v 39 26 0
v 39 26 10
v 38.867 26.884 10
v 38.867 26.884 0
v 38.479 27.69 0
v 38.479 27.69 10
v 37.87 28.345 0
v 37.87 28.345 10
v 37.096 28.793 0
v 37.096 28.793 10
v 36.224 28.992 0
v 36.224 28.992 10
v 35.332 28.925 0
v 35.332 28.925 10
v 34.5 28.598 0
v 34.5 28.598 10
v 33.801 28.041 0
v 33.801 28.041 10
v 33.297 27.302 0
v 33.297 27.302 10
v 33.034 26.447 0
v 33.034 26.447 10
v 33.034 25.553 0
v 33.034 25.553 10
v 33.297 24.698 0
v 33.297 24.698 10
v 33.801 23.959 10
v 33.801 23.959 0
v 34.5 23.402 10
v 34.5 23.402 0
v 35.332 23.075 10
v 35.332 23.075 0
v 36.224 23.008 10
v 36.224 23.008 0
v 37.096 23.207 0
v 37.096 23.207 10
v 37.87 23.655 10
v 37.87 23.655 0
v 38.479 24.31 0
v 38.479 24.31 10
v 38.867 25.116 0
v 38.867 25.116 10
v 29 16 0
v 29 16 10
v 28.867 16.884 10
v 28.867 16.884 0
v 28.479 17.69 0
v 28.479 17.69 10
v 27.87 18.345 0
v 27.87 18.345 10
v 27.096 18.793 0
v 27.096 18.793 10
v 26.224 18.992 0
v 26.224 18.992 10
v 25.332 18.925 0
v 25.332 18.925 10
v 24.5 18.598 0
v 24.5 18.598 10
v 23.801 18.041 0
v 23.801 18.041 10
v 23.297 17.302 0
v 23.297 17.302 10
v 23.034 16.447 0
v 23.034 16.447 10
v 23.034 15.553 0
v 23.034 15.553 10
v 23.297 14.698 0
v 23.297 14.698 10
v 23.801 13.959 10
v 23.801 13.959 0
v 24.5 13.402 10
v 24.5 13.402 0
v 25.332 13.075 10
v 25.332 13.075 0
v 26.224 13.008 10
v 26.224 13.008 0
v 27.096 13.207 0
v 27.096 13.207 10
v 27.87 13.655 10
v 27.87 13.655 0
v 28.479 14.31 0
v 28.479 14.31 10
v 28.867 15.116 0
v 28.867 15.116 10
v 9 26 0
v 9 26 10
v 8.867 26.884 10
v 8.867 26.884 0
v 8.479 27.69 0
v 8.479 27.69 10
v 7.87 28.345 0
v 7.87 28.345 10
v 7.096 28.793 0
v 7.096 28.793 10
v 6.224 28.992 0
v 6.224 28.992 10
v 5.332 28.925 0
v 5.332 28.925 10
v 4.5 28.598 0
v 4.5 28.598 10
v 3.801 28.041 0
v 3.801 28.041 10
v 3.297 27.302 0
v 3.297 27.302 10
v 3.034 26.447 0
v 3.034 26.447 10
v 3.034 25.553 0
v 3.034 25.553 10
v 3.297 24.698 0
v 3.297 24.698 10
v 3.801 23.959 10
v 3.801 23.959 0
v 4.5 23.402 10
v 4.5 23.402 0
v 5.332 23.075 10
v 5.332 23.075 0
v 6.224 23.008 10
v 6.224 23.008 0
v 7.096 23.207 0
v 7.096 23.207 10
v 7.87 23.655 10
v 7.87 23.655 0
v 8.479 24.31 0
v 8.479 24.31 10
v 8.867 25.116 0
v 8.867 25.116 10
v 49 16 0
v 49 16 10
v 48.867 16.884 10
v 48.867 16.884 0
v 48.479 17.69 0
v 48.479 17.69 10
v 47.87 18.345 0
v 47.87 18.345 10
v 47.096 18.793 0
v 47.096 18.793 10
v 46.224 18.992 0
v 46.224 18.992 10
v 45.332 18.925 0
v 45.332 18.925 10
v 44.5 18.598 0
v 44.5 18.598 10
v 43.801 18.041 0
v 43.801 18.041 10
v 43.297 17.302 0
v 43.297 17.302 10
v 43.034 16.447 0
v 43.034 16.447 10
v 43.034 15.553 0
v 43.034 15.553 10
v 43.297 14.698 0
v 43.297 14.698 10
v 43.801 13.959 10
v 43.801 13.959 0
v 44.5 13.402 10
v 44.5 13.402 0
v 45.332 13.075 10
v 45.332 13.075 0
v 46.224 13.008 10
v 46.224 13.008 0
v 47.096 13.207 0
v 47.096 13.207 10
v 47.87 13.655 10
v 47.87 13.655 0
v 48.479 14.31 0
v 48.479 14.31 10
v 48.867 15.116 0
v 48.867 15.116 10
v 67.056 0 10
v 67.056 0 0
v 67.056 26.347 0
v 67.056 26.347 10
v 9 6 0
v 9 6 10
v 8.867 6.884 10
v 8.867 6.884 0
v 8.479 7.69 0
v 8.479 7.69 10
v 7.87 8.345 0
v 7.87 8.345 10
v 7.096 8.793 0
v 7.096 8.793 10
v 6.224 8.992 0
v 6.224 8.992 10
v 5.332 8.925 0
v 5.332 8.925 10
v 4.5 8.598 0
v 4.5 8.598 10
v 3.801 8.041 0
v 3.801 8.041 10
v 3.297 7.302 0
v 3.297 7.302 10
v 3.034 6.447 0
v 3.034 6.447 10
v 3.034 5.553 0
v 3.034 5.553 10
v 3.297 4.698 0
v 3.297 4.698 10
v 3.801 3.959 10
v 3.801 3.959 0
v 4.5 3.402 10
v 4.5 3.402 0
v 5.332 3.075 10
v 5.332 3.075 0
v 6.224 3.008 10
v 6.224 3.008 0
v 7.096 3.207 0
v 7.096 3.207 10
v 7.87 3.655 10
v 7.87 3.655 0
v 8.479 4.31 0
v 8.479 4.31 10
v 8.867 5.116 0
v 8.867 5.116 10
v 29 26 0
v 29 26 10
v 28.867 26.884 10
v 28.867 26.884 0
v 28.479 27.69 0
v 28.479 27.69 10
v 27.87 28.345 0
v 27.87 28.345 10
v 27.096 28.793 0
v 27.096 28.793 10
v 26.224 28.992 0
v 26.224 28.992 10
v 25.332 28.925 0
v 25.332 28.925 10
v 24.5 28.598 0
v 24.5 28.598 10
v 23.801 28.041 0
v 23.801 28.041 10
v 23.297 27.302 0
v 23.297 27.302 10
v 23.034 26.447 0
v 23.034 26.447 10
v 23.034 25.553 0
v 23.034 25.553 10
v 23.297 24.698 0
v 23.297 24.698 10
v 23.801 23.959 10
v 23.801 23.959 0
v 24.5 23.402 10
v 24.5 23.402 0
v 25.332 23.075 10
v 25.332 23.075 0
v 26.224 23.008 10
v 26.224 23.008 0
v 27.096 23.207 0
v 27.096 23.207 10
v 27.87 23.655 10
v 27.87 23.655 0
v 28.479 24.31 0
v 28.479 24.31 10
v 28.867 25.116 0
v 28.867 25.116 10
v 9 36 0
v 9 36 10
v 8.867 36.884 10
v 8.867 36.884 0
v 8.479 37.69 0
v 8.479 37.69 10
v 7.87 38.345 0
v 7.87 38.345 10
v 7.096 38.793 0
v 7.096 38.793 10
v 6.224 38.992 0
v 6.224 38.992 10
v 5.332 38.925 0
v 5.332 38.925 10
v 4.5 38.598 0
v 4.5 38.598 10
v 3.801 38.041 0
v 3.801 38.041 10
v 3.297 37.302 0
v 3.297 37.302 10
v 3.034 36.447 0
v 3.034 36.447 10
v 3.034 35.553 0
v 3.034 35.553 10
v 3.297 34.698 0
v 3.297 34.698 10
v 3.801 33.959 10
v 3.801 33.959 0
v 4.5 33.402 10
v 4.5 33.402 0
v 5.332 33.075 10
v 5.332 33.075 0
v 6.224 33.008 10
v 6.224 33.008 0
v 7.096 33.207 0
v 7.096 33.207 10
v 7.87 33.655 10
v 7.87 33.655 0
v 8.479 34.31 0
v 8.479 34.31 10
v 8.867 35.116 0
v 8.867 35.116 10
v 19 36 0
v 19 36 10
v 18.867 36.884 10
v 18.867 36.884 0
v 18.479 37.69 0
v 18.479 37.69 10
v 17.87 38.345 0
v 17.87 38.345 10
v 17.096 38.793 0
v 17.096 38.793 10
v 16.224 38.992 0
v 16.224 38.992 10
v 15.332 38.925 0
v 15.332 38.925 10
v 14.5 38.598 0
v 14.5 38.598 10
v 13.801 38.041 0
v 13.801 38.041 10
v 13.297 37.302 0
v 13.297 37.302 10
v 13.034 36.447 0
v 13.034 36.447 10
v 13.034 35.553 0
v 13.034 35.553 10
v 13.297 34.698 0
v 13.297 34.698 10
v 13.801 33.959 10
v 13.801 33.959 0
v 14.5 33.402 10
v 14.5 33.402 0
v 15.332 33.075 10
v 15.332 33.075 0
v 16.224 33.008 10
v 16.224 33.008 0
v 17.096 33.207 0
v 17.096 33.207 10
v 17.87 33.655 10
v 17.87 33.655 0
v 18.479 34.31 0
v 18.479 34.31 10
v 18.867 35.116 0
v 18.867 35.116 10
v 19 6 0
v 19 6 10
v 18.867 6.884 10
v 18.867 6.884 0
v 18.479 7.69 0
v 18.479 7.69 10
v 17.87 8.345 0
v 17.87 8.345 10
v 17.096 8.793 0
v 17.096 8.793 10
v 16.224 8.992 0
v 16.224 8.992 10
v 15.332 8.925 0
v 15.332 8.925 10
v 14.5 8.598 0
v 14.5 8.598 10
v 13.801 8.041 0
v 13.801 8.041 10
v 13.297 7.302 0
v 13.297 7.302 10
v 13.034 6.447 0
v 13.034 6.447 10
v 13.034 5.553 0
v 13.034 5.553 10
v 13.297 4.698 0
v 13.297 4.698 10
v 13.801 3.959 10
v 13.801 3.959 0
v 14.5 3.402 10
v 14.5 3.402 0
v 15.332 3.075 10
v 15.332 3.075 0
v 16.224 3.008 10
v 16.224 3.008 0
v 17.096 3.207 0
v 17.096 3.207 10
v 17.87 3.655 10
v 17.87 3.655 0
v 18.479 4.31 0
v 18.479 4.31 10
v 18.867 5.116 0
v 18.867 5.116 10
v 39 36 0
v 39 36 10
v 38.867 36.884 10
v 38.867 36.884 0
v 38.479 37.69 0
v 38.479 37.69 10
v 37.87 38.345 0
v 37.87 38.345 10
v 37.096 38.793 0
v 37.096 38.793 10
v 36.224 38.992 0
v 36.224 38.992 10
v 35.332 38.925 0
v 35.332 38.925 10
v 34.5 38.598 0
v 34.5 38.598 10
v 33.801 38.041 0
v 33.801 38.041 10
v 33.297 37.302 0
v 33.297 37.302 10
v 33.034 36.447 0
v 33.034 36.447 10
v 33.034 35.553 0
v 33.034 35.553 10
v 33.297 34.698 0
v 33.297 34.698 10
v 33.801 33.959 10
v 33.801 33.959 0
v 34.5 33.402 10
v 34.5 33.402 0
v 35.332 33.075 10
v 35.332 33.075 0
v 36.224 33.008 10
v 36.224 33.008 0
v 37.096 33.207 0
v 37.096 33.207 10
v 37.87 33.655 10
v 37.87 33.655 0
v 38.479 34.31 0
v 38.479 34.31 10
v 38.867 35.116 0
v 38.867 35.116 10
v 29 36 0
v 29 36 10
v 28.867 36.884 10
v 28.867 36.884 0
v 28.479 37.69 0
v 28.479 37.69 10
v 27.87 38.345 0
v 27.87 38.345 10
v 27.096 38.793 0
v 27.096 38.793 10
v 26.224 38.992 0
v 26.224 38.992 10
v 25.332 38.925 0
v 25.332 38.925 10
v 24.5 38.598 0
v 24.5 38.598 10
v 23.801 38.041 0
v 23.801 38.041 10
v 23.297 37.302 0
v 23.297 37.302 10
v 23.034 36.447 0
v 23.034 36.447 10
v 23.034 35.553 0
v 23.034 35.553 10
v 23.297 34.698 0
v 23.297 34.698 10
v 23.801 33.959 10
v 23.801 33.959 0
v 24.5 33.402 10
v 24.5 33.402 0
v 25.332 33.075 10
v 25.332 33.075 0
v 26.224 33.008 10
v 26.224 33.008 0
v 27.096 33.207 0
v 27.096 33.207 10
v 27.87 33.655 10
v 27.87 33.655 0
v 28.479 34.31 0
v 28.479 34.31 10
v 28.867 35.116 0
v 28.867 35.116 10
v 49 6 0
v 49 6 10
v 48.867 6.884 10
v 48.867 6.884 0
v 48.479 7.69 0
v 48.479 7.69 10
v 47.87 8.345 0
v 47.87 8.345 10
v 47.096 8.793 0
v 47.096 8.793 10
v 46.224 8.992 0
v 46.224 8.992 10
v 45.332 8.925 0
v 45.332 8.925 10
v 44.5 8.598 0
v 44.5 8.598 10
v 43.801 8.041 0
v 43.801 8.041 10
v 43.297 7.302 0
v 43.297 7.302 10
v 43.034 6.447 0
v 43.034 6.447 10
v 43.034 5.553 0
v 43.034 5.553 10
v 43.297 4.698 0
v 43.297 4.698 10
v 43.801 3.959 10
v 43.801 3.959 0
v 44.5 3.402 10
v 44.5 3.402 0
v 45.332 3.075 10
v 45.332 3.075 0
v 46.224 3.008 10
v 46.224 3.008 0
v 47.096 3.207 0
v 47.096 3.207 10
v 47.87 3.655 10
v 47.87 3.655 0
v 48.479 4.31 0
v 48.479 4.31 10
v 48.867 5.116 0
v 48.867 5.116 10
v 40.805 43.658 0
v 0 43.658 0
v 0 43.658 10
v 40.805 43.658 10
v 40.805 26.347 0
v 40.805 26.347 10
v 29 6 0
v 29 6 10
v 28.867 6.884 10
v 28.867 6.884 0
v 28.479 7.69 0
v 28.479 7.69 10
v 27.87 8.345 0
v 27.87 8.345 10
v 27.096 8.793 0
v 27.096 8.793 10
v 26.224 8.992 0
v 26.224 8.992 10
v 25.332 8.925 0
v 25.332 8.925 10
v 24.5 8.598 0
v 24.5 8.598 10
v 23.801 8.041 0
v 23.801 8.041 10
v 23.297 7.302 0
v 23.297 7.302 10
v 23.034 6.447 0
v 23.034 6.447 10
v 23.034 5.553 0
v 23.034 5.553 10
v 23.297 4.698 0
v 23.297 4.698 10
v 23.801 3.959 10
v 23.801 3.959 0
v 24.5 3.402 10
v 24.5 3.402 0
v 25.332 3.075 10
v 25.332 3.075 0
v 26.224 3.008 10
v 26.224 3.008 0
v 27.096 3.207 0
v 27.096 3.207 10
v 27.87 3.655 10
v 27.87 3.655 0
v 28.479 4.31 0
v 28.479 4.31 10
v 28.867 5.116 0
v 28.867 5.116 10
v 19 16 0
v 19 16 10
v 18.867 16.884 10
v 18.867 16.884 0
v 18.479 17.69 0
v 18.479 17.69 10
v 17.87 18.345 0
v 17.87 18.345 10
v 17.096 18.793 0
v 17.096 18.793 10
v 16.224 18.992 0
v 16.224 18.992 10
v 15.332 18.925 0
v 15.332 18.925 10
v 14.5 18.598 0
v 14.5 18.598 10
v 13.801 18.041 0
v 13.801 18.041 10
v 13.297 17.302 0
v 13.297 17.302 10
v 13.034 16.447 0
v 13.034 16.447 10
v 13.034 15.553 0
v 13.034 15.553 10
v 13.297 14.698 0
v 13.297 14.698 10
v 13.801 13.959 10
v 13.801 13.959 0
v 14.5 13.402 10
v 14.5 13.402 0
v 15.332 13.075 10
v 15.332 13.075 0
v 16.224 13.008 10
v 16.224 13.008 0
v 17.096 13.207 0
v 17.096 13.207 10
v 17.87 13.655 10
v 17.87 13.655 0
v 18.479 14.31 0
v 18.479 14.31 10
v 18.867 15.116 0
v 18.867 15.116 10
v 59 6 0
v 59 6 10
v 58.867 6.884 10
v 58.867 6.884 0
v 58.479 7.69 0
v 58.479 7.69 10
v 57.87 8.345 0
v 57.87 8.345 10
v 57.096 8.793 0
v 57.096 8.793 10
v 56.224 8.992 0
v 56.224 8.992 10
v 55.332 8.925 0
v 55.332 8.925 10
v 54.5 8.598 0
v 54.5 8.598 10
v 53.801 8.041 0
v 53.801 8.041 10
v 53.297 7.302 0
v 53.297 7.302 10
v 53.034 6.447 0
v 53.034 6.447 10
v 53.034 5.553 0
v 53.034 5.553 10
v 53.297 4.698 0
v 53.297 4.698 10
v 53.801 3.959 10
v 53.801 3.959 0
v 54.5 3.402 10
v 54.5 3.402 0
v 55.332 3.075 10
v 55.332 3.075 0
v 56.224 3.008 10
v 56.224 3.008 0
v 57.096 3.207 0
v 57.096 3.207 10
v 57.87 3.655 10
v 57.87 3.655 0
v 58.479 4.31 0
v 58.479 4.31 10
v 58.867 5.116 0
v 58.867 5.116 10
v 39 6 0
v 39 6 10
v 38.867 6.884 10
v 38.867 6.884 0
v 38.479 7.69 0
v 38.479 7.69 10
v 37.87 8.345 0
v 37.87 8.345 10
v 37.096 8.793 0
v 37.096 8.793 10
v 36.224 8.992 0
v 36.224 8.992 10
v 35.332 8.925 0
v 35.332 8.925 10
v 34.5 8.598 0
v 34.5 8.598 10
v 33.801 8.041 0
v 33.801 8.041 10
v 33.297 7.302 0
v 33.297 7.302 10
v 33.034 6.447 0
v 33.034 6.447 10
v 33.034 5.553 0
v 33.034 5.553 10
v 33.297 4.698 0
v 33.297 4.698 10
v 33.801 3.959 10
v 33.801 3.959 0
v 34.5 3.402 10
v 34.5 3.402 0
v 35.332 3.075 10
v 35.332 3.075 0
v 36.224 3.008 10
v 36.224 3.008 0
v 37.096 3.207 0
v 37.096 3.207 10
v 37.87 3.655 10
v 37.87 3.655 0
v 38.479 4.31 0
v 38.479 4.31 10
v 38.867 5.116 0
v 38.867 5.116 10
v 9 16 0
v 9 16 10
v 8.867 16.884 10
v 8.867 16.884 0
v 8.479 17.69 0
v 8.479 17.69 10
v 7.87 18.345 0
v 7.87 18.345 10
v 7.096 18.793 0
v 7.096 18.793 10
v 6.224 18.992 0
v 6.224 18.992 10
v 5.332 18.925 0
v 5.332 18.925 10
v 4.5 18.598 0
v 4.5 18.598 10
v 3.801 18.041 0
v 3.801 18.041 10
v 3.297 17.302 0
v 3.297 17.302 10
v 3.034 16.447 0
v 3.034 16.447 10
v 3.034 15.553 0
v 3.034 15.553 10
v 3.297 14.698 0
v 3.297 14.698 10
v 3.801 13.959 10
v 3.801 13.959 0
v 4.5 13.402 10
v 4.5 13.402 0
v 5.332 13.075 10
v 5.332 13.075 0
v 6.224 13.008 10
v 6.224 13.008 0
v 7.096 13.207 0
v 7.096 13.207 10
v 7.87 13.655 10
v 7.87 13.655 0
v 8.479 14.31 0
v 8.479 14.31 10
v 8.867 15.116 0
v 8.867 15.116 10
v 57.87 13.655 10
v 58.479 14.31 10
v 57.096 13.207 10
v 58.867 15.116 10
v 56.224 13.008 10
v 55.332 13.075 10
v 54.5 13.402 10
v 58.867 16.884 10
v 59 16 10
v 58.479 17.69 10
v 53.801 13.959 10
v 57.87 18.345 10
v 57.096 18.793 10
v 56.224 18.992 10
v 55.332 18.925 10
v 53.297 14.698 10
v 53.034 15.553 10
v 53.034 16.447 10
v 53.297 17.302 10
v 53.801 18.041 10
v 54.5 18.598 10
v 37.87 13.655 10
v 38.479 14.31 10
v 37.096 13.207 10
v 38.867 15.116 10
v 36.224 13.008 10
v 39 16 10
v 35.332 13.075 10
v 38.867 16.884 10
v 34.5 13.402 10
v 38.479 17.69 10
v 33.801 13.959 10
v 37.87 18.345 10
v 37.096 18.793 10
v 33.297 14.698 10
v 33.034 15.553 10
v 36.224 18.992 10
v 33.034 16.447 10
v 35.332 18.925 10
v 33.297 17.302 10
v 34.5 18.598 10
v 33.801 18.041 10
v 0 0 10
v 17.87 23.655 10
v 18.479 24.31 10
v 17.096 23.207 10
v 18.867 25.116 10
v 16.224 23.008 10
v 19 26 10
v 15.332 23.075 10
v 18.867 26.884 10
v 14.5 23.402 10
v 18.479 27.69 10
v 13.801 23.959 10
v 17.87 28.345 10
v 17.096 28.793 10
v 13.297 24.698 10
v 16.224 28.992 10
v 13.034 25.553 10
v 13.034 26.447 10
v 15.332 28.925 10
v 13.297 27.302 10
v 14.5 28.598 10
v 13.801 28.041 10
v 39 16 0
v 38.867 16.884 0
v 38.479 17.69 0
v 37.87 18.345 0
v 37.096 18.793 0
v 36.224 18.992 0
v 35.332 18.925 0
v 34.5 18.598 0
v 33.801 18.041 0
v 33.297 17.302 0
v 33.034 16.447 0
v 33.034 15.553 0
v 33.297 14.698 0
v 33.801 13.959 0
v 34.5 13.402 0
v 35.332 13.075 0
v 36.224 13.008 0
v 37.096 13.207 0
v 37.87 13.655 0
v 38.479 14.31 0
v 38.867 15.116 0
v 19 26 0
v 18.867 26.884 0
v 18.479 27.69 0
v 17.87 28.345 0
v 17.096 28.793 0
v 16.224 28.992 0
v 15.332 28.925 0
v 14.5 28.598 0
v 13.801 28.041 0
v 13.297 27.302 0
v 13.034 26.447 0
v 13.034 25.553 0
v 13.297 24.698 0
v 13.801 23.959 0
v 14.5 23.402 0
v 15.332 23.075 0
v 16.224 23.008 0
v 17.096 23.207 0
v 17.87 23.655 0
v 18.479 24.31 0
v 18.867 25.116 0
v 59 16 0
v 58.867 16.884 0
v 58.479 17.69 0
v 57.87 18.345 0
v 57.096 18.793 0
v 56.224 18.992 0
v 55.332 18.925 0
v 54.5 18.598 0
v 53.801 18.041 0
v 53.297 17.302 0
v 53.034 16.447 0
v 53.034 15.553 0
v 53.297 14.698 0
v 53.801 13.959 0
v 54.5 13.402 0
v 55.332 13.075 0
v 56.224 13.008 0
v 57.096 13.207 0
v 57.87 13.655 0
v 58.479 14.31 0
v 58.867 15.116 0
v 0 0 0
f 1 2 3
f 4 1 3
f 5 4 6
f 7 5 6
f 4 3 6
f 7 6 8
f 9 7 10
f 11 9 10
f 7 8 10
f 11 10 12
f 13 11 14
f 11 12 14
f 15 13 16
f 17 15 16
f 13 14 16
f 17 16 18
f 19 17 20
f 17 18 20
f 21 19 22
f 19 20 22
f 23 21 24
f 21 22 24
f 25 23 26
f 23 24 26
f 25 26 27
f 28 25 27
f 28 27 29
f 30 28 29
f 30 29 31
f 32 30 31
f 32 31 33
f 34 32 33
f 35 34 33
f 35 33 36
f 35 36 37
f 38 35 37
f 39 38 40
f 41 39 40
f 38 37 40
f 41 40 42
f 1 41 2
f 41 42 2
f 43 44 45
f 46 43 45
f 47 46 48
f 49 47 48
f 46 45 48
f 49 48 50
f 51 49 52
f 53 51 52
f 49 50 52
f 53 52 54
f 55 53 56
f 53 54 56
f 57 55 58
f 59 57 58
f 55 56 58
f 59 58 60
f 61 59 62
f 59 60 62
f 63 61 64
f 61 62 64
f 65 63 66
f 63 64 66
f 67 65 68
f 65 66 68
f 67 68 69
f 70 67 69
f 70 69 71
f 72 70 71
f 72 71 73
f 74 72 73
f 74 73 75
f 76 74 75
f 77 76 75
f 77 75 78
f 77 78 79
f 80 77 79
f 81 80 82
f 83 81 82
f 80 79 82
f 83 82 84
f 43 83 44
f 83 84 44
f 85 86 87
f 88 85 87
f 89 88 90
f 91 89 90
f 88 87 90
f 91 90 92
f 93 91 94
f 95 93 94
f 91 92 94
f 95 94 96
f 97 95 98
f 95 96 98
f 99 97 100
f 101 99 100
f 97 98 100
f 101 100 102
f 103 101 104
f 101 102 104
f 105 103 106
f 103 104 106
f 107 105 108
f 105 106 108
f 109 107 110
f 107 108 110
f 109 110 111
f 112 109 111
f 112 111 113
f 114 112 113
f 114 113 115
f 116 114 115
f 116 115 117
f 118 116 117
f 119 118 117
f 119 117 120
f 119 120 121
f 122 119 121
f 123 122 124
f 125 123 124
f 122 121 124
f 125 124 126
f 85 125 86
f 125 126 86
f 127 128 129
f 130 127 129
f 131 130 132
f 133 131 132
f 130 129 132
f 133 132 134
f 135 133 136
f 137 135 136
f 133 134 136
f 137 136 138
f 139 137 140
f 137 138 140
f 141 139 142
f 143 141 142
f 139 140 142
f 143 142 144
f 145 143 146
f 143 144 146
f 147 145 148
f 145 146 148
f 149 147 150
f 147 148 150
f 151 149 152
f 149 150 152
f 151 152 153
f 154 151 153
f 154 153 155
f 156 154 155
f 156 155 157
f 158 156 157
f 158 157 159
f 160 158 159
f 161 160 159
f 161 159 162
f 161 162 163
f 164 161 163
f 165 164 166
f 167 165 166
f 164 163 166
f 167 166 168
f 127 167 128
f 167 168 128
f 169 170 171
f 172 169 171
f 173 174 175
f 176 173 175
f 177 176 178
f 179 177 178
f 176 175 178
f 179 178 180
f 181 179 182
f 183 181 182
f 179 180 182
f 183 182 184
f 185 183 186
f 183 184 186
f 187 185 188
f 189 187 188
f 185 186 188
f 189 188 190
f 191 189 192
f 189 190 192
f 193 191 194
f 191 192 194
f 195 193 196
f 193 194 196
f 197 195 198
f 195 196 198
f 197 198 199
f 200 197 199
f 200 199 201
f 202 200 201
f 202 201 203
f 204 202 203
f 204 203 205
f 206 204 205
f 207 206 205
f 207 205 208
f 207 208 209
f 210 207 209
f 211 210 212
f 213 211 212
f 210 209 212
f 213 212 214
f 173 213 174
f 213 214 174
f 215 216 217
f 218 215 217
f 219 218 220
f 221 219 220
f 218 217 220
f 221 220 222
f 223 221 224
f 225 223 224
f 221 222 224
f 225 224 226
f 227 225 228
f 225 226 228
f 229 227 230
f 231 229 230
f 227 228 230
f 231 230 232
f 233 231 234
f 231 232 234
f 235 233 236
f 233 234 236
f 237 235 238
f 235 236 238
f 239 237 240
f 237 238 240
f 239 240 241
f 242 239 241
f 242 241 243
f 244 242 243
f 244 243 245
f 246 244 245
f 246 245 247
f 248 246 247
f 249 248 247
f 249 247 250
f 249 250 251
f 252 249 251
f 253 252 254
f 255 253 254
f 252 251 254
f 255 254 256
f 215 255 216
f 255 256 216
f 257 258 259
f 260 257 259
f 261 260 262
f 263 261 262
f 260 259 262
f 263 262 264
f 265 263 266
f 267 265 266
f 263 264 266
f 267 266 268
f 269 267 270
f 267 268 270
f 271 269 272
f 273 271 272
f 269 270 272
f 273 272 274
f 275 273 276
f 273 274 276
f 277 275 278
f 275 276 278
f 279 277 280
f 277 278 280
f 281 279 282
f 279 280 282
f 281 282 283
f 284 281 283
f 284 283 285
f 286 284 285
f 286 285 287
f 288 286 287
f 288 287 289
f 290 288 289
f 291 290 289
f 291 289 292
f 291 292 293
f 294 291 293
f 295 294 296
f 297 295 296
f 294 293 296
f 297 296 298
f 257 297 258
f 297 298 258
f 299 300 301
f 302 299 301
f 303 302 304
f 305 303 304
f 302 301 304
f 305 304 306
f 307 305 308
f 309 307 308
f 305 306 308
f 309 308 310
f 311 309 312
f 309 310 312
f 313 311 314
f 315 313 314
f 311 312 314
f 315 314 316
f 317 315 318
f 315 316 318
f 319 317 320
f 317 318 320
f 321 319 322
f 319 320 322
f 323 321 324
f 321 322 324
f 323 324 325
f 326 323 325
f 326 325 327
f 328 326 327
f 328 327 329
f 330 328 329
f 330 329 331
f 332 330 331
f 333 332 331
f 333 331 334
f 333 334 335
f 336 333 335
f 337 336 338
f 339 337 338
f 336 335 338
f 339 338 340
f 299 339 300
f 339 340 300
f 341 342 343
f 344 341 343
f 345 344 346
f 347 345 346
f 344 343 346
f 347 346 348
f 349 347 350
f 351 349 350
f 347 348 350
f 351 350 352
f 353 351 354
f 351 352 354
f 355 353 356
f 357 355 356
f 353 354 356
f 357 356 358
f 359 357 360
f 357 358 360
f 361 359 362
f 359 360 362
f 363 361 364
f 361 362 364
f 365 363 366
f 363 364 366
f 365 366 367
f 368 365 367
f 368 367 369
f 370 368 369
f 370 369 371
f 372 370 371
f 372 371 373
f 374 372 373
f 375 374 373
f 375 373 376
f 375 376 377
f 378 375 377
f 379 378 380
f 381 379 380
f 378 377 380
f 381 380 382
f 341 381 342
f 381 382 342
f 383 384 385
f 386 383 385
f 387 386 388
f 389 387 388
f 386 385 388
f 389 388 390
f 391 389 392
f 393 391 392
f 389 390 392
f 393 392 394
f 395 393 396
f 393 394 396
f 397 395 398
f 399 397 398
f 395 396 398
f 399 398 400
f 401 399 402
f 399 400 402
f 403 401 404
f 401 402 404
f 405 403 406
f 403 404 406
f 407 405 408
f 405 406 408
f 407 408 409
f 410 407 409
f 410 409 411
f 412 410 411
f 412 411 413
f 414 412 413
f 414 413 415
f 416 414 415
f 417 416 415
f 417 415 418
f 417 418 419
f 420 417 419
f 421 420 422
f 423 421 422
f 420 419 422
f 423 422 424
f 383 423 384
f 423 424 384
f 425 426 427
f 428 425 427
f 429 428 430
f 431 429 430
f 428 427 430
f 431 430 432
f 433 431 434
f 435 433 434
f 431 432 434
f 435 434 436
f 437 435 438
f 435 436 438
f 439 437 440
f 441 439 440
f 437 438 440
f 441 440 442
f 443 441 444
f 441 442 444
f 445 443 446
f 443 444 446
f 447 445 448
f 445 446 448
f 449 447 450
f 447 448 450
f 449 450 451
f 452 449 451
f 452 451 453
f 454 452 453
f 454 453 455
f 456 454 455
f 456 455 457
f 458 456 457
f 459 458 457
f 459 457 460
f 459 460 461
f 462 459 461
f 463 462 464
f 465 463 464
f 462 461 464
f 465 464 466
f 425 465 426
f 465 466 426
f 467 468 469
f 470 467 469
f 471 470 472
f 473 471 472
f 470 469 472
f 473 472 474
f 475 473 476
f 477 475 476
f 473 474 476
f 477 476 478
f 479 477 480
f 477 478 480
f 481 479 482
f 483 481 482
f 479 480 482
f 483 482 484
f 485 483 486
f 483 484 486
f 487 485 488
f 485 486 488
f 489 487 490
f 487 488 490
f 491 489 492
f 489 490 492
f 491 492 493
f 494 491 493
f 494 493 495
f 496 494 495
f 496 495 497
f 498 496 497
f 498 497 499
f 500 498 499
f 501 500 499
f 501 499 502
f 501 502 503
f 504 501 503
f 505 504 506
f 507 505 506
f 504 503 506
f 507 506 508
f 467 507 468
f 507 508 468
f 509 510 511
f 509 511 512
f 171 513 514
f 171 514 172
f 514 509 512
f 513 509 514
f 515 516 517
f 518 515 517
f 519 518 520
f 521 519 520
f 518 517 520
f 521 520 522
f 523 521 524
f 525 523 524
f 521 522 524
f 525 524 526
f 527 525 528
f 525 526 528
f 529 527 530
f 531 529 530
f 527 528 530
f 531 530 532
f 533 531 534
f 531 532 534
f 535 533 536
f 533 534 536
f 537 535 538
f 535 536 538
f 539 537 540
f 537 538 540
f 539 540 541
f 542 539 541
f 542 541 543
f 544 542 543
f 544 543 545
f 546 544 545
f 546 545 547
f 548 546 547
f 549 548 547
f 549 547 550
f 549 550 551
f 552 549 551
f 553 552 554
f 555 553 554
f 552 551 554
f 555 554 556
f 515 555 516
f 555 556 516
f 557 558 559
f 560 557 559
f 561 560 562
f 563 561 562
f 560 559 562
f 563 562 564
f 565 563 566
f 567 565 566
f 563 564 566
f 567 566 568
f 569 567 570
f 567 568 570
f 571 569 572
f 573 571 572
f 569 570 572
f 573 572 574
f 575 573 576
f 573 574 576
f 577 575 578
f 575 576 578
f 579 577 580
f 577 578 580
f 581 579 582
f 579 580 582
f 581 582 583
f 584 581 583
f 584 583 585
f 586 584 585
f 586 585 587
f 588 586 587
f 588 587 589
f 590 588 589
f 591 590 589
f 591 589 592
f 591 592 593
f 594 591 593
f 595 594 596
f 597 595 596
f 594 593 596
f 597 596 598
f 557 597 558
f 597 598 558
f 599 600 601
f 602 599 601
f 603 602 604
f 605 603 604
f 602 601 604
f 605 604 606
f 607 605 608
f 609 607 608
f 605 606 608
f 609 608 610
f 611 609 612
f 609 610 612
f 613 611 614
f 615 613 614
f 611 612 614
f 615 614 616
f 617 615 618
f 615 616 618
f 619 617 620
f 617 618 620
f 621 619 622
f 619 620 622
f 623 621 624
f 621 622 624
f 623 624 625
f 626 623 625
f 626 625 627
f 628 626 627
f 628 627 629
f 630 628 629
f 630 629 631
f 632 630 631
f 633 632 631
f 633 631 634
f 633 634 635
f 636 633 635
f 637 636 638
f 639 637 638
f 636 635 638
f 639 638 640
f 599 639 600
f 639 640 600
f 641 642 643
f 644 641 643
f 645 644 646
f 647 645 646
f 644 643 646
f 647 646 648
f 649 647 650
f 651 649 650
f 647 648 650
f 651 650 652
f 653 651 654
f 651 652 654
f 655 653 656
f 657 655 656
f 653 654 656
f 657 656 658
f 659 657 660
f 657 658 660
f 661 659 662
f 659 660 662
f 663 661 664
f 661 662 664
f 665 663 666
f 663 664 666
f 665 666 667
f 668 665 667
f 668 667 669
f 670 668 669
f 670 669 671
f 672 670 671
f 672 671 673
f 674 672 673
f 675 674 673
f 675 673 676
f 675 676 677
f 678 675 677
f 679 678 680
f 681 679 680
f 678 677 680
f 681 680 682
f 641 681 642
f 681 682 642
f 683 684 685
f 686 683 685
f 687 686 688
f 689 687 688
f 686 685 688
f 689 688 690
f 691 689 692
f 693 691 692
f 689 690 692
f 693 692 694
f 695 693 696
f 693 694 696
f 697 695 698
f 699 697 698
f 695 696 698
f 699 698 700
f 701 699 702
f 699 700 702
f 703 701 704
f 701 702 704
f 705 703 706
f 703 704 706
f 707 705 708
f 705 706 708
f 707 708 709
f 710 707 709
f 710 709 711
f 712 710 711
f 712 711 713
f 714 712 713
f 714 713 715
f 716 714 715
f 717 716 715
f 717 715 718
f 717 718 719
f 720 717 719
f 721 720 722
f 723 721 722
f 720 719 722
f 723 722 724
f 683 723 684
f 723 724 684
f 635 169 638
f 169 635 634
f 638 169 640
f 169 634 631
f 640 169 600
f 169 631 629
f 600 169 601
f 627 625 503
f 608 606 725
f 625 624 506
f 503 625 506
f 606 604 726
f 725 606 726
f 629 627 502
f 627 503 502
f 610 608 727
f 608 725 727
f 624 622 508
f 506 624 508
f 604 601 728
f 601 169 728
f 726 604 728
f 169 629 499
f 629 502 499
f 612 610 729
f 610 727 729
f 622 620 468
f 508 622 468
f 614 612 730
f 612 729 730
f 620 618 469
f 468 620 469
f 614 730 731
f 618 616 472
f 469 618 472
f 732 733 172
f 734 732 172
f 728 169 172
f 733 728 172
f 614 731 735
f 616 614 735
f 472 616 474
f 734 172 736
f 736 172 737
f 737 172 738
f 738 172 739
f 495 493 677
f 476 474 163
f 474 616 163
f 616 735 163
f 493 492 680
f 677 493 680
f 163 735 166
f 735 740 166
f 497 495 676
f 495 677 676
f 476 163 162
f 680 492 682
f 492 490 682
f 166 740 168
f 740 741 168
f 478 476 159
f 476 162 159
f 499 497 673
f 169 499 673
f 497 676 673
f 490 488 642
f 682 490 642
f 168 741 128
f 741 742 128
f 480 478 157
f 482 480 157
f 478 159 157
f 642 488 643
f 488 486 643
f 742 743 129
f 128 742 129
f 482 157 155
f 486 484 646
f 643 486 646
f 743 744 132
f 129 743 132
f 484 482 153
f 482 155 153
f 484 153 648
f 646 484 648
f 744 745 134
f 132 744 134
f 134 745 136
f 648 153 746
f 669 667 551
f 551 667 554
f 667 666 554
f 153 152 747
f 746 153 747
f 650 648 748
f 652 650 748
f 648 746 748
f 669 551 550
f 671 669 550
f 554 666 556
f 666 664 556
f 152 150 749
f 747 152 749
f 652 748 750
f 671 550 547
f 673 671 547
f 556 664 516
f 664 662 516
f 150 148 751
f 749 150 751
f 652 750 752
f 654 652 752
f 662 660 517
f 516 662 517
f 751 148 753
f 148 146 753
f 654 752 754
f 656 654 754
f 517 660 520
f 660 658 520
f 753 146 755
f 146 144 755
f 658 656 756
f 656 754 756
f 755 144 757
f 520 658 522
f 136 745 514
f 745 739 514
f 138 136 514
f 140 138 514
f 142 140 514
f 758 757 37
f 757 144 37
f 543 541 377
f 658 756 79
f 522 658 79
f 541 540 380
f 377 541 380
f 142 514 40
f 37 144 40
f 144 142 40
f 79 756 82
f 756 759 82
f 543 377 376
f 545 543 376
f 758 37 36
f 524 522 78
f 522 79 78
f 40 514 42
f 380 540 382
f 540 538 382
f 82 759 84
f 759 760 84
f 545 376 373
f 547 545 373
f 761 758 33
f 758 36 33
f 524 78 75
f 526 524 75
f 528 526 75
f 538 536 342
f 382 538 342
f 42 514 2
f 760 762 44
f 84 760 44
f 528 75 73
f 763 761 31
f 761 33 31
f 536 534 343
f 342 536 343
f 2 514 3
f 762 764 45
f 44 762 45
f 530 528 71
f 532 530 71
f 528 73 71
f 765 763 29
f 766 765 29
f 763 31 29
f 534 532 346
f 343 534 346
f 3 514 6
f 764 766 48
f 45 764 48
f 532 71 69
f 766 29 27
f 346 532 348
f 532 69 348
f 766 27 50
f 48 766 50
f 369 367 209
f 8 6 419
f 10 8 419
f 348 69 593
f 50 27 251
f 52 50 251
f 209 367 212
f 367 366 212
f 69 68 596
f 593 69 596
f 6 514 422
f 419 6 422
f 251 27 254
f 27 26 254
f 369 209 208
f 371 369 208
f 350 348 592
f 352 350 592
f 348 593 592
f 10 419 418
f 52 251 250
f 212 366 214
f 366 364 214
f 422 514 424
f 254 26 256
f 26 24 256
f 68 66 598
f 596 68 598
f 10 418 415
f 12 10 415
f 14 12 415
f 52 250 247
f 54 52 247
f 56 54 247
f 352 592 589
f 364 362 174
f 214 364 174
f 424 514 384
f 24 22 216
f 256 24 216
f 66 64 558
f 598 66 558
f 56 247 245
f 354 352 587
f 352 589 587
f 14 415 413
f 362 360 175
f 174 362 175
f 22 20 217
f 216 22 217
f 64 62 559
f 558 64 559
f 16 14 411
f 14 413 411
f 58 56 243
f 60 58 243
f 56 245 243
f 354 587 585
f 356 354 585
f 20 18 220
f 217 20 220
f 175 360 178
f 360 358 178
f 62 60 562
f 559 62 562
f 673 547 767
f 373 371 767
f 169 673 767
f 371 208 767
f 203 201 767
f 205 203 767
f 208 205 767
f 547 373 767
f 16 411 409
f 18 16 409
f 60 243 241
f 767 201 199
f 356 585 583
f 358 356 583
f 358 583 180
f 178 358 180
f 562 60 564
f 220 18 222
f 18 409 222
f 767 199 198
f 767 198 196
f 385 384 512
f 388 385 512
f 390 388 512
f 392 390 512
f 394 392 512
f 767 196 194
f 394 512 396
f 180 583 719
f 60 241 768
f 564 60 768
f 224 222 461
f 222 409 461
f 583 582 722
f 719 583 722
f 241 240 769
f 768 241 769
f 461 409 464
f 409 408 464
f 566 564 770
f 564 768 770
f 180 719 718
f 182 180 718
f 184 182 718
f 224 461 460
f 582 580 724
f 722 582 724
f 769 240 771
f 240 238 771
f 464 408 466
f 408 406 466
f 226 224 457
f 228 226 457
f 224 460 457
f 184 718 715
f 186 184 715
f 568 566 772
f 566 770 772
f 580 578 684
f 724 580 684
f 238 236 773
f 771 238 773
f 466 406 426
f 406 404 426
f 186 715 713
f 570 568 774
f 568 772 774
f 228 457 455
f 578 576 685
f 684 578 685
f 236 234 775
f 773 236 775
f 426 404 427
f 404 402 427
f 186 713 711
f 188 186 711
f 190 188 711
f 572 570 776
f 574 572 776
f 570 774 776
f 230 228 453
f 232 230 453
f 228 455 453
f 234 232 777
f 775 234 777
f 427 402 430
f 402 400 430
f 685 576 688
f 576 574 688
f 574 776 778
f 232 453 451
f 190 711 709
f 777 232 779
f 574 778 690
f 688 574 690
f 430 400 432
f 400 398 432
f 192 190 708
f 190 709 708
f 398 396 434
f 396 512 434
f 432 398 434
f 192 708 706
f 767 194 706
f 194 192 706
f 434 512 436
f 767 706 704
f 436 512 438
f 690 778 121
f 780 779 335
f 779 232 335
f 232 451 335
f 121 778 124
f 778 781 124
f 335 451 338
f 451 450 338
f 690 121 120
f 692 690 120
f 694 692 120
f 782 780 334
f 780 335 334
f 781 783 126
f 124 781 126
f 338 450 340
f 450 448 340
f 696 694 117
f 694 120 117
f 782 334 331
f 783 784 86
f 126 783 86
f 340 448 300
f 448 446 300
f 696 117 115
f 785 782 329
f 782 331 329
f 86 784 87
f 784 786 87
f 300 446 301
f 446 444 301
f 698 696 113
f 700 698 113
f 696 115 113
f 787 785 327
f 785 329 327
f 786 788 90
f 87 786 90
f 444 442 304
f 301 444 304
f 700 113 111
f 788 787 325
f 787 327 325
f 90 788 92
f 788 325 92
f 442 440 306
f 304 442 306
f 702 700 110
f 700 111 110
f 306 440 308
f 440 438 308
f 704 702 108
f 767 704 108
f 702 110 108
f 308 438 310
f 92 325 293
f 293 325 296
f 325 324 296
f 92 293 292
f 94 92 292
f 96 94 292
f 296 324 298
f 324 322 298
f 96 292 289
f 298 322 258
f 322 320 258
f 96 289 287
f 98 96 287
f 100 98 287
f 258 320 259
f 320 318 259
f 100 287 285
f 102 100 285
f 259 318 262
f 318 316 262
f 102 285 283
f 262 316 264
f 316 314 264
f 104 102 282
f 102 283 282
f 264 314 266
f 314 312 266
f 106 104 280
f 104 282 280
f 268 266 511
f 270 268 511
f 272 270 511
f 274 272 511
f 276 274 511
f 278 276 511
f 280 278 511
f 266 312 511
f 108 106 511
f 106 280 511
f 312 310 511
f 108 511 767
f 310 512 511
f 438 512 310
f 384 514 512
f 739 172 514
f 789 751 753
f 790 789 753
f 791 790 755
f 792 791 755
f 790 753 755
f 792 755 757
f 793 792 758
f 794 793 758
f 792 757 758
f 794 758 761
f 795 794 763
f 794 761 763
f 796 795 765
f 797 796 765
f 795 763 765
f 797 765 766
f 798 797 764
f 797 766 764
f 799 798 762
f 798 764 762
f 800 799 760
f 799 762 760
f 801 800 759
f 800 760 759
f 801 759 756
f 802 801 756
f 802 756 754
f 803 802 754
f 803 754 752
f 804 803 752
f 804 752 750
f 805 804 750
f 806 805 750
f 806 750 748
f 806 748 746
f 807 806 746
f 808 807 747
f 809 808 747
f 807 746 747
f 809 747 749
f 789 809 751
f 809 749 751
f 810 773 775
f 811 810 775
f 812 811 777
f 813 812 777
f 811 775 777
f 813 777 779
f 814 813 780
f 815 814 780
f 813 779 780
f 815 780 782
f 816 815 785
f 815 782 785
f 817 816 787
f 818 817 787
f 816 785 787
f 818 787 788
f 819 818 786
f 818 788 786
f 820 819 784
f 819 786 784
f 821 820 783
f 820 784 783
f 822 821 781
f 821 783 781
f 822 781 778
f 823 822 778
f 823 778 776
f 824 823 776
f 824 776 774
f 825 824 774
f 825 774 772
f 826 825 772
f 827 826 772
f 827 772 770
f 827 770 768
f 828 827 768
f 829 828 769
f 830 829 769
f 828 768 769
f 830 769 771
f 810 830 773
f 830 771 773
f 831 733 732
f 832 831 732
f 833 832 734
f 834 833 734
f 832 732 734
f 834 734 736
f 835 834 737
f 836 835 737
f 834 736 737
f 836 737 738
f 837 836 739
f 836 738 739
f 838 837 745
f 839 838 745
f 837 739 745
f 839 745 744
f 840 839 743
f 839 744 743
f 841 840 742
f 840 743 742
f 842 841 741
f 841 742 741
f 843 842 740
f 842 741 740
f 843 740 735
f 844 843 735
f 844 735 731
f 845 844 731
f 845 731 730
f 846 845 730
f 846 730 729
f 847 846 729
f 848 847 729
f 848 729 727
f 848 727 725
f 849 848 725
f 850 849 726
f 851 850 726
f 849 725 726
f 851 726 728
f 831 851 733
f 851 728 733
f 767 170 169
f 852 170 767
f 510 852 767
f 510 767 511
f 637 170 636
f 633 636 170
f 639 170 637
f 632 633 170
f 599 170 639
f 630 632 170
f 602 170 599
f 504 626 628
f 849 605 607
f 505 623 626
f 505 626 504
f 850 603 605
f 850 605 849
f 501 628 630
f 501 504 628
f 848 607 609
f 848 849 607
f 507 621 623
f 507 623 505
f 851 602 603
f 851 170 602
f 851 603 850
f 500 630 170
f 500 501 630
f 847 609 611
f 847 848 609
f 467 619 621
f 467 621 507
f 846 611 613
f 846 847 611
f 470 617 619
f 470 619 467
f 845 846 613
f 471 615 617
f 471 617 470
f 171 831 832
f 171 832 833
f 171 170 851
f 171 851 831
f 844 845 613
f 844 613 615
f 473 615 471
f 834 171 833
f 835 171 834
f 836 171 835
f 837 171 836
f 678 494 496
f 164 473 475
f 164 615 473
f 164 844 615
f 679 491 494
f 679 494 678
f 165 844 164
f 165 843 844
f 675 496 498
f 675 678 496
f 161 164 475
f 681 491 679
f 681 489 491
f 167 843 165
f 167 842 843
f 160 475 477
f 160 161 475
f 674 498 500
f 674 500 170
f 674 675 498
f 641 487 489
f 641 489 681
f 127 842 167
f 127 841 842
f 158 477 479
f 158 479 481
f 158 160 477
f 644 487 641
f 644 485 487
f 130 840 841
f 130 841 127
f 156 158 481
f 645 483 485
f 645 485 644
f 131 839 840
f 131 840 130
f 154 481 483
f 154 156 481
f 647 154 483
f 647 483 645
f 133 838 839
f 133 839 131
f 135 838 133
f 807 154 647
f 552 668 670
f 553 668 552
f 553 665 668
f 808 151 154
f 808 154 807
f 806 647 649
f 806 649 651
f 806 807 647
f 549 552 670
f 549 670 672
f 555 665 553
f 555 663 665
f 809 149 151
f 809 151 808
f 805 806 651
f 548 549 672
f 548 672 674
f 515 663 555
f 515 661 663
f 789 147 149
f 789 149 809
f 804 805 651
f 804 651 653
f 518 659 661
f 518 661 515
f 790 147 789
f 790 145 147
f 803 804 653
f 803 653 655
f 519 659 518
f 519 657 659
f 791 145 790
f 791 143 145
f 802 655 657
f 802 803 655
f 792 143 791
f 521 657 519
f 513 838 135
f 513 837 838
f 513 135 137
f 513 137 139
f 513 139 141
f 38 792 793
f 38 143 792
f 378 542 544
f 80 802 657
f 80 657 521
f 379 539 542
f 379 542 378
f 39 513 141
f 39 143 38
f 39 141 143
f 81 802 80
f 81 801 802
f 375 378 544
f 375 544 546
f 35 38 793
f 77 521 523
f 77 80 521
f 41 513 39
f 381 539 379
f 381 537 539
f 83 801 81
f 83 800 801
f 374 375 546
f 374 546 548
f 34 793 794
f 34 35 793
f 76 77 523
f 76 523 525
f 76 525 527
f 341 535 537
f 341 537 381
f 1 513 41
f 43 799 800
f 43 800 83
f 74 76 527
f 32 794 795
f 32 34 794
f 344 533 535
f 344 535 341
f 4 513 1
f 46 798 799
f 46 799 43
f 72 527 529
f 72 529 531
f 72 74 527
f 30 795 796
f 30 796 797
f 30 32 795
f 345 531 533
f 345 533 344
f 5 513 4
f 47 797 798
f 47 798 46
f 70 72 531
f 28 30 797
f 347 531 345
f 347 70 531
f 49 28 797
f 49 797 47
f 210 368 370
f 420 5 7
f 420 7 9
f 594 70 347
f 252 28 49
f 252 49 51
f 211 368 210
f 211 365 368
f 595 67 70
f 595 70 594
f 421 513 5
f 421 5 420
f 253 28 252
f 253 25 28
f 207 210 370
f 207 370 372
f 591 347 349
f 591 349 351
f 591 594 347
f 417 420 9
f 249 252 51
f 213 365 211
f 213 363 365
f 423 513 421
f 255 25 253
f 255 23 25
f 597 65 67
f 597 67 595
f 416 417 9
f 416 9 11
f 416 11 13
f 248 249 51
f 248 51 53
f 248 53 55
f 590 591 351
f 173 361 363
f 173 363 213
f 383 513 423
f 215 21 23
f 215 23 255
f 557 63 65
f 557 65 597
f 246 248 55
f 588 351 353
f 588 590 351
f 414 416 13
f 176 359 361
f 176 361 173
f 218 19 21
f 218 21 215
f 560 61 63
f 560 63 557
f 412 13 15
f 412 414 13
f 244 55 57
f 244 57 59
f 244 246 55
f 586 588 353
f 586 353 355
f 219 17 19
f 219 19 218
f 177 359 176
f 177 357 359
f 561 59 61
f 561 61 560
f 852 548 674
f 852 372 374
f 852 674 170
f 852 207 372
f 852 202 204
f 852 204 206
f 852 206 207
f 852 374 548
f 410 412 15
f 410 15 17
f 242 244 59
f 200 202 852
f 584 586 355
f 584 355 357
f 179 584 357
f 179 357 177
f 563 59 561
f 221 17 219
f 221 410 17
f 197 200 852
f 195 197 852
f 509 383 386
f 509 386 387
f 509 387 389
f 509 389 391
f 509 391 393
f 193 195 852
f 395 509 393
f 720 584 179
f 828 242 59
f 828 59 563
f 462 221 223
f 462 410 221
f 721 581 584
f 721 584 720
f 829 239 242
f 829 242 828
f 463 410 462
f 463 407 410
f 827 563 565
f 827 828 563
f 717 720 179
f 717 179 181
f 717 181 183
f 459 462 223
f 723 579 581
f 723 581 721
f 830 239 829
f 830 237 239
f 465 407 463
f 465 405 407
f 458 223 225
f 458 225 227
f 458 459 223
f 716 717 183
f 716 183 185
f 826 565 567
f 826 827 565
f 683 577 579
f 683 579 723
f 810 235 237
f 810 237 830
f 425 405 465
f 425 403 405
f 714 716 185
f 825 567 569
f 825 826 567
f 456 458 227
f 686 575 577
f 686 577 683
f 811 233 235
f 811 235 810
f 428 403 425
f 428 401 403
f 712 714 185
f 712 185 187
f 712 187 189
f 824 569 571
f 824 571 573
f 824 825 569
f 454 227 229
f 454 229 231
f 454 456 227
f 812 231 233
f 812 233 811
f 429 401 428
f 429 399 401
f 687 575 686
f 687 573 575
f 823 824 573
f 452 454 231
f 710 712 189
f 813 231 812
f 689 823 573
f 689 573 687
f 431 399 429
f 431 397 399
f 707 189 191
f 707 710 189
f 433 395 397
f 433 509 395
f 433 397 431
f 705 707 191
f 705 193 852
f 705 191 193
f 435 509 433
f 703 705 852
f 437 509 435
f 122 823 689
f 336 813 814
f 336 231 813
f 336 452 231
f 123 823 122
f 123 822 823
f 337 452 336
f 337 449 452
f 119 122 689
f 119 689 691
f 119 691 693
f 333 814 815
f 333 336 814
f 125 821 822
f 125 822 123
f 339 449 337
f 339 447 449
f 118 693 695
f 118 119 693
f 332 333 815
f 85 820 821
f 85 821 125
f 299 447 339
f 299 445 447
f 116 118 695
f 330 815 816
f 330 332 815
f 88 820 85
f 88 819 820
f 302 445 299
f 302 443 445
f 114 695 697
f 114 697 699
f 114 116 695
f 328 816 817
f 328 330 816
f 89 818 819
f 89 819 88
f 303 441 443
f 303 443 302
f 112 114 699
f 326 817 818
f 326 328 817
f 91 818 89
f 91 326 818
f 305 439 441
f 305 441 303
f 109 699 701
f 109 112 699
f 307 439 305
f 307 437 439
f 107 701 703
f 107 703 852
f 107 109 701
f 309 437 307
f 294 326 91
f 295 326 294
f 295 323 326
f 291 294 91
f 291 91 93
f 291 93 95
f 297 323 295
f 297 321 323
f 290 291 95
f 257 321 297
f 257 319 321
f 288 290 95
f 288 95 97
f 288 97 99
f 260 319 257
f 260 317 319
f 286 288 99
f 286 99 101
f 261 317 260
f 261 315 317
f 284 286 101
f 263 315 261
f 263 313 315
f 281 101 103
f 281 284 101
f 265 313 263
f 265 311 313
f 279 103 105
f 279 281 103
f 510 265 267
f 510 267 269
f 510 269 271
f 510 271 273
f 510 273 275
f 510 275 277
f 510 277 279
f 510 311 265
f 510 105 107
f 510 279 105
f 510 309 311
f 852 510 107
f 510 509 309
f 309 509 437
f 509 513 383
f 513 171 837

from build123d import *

# Parameters (mm, degrees)
BOSS_EXTRUDE1_DEPTH  = 10
SKETCH2_R            = 3
CUT_EXTRUDE1_DEPTH   = 10
LPATTERN1_COUNT      = 6
LPATTERN1_PITCH      = 10
LPATTERN1_COUNT_DIR2 = 4
LPATTERN1_PITCH_DIR2 = 10


with BuildPart() as part:
    # Sketch1 → Boss-Extrude1 (new body)
    with BuildSketch(Plane.XY):
        Polygon((0, 0), (0, 43.65799141), (40.804527919, 43.65799141), (40.804527919, 26.346979566), (67.056392035, 26.346979566), (67.056392035, 4.280195236), (67.056392035, 0), align=None)
    extrude(amount=BOSS_EXTRUDE1_DEPTH)

    # Sketch2 → Cut-Extrude1 (cut)
    with BuildSketch(Plane.XY.offset(10)):
        with Locations((6, 6)):
            Circle(SKETCH2_R)
    cut_extrude1 = extrude(amount=-CUT_EXTRUDE1_DEPTH, mode=Mode.SUBTRACT)

    # LPattern1: Cut-Extrude1 6 × 4, 4 skipped
    with Locations(*[(i * LPATTERN1_PITCH, j * LPATTERN1_PITCH_DIR2, 0) for i in range(LPATTERN1_COUNT) for j in range(LPATTERN1_COUNT_DIR2) if (i, j) not in ((0, 0), (4, 2), (4, 3), (5, 2), (5, 3))]):
        add(cut_extrude1, mode=Mode.SUBTRACT)


solid = part.part
